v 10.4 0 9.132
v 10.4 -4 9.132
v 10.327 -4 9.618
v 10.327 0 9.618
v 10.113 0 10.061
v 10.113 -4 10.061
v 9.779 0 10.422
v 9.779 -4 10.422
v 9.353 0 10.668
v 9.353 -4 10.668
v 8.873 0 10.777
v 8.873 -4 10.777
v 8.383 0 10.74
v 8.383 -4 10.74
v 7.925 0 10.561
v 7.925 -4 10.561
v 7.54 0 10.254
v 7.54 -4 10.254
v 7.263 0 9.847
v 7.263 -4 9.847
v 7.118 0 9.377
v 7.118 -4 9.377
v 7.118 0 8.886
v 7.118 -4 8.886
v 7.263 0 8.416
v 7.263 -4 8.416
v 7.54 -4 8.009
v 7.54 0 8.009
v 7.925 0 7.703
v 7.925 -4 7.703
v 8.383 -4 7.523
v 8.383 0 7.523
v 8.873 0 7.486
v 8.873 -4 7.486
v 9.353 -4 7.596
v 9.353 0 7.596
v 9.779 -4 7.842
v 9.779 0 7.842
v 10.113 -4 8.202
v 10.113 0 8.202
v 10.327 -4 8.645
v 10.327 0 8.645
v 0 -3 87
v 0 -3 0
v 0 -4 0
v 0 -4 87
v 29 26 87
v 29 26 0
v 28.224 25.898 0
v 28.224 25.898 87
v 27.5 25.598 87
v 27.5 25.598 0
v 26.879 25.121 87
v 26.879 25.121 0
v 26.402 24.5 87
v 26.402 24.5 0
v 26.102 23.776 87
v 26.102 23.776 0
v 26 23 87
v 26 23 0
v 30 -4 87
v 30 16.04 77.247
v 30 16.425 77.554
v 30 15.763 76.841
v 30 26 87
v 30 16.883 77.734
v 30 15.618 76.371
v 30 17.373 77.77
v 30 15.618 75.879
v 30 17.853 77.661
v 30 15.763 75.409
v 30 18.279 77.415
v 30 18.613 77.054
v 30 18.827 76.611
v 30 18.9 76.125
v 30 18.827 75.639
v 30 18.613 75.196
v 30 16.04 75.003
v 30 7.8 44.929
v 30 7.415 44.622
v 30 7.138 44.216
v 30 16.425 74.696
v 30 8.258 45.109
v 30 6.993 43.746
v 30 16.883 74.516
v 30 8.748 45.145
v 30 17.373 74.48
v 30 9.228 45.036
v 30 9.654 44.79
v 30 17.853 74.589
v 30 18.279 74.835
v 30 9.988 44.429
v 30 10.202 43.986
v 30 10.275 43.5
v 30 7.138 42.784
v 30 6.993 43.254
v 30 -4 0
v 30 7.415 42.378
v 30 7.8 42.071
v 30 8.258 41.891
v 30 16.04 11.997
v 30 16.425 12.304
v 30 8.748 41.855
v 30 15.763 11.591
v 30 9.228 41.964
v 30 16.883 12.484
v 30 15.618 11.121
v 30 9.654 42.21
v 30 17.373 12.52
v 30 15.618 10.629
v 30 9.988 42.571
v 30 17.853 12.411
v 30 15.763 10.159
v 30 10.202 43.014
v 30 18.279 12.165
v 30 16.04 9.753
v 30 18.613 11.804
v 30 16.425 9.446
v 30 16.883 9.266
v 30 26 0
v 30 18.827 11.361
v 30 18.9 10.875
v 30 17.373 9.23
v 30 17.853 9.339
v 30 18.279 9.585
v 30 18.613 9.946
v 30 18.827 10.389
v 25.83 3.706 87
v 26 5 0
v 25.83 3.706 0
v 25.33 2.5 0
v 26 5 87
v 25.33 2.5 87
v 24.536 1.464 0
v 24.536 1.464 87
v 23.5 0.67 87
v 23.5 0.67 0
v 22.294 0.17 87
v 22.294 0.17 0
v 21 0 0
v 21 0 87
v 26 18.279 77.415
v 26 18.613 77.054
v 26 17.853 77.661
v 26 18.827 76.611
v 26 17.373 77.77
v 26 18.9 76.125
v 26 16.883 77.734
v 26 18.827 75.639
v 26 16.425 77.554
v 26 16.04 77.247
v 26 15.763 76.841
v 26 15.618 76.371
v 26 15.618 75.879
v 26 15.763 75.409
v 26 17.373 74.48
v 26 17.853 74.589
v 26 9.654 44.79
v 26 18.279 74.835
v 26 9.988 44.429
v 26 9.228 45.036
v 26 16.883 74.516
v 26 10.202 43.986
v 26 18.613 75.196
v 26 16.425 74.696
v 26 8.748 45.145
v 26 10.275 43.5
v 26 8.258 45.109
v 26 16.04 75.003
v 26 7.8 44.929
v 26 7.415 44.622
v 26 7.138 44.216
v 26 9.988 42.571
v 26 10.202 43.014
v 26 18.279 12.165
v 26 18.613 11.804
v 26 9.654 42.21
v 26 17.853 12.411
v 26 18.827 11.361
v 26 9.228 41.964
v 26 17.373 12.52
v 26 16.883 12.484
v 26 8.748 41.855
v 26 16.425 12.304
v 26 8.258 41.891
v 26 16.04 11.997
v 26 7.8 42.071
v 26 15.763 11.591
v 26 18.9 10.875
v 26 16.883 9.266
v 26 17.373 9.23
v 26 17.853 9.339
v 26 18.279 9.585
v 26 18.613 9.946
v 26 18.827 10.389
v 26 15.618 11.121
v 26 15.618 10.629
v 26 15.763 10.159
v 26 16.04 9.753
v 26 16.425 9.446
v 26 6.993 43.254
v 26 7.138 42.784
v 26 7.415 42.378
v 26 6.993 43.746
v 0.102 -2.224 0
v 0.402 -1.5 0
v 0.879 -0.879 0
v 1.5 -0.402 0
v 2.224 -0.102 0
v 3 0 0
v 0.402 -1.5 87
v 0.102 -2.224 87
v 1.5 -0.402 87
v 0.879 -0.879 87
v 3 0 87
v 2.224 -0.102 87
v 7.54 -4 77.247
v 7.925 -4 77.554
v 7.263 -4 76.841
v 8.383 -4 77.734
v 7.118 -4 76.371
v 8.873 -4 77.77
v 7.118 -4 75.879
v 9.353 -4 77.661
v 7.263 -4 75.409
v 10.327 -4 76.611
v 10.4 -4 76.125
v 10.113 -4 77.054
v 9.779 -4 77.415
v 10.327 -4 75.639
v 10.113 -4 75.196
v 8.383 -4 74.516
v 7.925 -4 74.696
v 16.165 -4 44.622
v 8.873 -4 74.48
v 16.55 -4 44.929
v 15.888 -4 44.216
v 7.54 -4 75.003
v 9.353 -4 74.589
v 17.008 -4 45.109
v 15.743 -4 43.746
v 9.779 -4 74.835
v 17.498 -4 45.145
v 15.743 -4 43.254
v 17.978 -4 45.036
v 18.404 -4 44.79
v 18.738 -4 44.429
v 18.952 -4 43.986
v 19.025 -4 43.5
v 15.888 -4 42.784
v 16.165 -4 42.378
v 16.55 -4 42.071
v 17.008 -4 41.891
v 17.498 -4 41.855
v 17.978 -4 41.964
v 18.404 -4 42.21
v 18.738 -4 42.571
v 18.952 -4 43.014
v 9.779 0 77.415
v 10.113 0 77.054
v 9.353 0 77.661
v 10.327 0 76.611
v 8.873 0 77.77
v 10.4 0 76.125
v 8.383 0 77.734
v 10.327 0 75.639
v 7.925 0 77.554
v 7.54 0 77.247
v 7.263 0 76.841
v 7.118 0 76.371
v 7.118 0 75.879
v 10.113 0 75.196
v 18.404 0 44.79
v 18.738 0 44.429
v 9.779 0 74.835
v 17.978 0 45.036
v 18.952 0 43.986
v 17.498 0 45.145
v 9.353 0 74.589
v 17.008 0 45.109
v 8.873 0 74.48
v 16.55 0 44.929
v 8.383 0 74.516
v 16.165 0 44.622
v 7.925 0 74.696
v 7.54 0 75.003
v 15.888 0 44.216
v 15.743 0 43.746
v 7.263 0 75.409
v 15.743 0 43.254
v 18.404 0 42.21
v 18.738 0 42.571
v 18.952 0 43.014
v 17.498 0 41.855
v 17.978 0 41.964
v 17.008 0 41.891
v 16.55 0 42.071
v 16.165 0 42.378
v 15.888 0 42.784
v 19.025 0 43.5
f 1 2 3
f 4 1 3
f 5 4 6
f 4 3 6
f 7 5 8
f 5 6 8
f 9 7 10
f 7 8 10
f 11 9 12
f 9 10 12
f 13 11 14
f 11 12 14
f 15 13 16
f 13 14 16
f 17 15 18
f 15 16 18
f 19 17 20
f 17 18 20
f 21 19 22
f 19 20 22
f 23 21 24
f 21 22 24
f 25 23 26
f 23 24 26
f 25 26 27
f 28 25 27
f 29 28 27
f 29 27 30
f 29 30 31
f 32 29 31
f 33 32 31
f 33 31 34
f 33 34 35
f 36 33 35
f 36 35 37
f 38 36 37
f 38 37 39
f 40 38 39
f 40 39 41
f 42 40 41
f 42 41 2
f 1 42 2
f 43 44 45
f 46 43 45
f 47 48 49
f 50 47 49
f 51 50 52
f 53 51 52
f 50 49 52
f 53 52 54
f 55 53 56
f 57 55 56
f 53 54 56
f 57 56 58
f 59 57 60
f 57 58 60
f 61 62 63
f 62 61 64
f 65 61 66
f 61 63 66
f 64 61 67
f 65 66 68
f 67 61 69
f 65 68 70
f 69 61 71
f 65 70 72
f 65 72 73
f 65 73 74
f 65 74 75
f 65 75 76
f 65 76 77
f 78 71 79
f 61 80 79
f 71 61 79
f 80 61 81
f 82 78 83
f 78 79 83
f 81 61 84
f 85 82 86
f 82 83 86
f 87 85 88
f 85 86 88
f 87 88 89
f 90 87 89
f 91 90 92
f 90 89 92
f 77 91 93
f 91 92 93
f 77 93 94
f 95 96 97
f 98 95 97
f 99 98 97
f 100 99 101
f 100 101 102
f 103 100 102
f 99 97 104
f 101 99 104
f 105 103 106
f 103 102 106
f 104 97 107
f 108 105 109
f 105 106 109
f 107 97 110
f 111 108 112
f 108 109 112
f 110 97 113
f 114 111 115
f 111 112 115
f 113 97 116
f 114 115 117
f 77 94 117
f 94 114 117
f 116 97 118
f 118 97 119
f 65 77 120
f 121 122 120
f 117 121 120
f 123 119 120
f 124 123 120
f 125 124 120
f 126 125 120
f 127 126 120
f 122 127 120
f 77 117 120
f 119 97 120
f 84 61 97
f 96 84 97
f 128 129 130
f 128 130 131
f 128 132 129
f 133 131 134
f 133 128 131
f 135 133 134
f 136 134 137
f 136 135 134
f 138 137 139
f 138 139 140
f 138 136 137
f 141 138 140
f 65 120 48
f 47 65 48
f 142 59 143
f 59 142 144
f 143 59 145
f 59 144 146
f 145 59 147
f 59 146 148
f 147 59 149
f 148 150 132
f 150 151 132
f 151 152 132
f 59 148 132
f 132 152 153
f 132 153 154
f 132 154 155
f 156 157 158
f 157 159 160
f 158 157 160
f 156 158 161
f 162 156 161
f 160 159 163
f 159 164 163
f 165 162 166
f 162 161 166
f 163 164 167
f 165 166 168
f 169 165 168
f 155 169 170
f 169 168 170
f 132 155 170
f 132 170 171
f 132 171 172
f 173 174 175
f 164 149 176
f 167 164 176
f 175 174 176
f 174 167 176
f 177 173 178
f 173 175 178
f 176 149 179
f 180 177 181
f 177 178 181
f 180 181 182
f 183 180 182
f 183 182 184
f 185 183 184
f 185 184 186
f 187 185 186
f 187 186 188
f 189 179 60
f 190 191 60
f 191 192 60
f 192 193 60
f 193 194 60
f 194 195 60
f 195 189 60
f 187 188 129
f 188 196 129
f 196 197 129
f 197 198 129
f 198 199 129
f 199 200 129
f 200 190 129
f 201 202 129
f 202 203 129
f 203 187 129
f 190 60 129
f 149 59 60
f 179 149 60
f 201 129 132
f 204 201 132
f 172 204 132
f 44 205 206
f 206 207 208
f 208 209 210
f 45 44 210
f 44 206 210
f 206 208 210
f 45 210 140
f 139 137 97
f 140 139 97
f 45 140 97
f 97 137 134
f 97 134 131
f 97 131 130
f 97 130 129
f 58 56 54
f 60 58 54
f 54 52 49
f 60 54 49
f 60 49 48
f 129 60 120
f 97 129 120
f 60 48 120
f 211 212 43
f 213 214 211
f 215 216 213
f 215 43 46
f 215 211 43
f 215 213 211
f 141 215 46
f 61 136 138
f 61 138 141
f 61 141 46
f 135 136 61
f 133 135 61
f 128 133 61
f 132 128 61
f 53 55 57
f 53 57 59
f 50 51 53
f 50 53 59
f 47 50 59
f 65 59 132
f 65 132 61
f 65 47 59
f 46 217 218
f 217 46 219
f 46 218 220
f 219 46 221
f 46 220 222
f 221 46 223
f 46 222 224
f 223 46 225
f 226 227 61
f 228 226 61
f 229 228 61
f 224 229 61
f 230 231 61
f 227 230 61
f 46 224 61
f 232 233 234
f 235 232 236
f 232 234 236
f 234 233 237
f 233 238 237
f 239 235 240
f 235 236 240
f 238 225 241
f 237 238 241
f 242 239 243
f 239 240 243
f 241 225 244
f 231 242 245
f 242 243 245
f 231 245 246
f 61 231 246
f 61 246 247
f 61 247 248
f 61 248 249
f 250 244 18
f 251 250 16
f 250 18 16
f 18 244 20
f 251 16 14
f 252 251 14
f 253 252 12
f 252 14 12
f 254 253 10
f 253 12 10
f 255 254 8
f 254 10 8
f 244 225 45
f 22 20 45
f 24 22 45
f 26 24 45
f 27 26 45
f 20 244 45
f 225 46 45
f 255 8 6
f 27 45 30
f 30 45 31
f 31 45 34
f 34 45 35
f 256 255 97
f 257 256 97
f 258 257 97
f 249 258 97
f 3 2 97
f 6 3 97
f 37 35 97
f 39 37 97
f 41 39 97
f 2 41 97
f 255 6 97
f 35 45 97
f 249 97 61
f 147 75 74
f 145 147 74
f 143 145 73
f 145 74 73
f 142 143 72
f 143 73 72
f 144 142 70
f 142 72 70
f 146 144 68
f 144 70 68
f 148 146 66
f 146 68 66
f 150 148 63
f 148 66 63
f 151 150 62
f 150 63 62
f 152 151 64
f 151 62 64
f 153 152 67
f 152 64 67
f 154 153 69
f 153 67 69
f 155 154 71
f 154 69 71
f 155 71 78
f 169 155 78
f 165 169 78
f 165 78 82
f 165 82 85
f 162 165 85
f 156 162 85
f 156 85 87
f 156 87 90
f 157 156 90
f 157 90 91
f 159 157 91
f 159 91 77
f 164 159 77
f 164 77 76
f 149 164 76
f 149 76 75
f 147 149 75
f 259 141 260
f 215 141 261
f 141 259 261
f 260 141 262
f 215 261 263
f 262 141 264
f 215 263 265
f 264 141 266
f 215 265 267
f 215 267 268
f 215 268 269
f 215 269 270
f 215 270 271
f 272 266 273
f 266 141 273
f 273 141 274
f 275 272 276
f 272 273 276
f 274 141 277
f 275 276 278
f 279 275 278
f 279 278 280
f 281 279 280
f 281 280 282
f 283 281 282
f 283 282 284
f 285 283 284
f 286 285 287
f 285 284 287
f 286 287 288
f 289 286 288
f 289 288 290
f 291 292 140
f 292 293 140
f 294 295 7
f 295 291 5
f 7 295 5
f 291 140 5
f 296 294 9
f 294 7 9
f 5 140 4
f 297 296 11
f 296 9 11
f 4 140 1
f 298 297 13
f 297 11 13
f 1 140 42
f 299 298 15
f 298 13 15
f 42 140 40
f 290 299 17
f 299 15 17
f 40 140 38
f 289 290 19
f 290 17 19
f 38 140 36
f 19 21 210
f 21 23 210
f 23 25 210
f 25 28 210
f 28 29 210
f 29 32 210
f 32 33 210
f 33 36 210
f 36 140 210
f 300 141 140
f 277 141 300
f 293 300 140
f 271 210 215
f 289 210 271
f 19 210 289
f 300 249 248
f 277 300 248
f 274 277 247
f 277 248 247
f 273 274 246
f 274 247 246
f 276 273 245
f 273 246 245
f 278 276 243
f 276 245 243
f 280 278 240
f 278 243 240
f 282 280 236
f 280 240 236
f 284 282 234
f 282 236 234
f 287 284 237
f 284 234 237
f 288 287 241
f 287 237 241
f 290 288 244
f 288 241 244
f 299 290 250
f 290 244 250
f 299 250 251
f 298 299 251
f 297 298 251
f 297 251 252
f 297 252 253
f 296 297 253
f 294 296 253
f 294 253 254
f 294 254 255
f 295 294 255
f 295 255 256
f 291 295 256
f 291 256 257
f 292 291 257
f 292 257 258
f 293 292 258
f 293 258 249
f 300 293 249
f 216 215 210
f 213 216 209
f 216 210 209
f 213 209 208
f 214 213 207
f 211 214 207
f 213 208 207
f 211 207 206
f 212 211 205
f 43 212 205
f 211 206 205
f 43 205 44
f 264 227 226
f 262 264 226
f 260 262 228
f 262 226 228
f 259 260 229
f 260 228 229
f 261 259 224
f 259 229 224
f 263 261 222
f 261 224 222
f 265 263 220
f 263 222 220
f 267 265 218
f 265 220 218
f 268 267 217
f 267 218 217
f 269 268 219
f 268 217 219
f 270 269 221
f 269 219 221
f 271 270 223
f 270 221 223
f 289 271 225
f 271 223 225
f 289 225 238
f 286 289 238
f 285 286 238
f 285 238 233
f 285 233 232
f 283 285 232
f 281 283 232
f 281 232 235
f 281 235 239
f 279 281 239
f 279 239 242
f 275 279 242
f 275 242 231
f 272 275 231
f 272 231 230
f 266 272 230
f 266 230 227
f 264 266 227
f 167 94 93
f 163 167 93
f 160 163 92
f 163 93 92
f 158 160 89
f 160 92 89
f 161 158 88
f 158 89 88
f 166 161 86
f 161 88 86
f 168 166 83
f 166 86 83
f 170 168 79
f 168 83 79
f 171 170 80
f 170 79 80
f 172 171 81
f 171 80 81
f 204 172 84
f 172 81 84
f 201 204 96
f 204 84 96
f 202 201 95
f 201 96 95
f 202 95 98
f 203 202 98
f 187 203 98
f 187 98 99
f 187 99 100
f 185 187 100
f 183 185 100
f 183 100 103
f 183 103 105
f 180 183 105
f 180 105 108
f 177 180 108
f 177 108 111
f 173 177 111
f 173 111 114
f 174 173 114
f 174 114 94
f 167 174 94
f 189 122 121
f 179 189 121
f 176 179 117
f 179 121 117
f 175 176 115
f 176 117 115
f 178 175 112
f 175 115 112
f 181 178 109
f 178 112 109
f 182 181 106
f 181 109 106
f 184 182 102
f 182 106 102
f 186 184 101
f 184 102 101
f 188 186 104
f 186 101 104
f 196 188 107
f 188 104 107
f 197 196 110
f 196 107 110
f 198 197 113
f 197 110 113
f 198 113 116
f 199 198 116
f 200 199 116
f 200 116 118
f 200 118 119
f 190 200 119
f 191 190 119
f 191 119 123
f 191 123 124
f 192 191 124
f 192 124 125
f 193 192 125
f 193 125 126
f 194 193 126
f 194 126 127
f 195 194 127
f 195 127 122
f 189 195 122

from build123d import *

# Parameters (mm, degrees)
F1_DEPTH   = 87
F4_D       = 3.3
F4_ON_F3_D = 3.3
F5_R       = 5


with BuildPart() as f1:
    # F0 (on Top) → F1 (new body)
    with BuildSketch(Plane.XY):
        with BuildLine():
            Line((26, 23), (26, 0))
            Line((26, 0), (30, 0))
            Line((30, 0), (30, 26))
            Line((30, 26), (29, 26))
            ThreePointArc((29, 26), (26.8786796564, 25.1213203436), (26, 23))
        make_face()
        with BuildLine():
            Line((26, 0), (3, 0))
            ThreePointArc((3, 0), (0.8786796564, -0.8786796564), (0, -3))
            Line((0, -3), (0, -4))
            Line((0, -4), (30, -4))
            Line((30, -4), (30, 0))
            Line((30, 0), (26, 0))
        make_face()
    extrude(amount=F1_DEPTH)

    # F4 (through all)
    with Locations(Plane(origin=(26, 0, 0), x_dir=(0, -1, 0), z_dir=(-1, 0, 0))):
        with Locations((-17.25, 10.875), (-17.25, 76.125), (-8.625, 43.5)):
            Hole(F4_D / 2)

    # F4 on F3 (through all)
    with Locations(Plane(origin=(0, 0, 0), x_dir=(-1, 0, 0), z_dir=(0, 1, 0))):
        with Locations((-8.75, 9.1315675527), (-17.375, 43.5), (-8.75, 76.125)):
            Hole(F4_ON_F3_D / 2)

    # F5
    f5_edges = [f1.edges().sort_by_distance(p)[0] for p in [
        (26, 0, 43.5),
    ]]
    fillet(f5_edges, radius=F5_R)


solid = f1.part
